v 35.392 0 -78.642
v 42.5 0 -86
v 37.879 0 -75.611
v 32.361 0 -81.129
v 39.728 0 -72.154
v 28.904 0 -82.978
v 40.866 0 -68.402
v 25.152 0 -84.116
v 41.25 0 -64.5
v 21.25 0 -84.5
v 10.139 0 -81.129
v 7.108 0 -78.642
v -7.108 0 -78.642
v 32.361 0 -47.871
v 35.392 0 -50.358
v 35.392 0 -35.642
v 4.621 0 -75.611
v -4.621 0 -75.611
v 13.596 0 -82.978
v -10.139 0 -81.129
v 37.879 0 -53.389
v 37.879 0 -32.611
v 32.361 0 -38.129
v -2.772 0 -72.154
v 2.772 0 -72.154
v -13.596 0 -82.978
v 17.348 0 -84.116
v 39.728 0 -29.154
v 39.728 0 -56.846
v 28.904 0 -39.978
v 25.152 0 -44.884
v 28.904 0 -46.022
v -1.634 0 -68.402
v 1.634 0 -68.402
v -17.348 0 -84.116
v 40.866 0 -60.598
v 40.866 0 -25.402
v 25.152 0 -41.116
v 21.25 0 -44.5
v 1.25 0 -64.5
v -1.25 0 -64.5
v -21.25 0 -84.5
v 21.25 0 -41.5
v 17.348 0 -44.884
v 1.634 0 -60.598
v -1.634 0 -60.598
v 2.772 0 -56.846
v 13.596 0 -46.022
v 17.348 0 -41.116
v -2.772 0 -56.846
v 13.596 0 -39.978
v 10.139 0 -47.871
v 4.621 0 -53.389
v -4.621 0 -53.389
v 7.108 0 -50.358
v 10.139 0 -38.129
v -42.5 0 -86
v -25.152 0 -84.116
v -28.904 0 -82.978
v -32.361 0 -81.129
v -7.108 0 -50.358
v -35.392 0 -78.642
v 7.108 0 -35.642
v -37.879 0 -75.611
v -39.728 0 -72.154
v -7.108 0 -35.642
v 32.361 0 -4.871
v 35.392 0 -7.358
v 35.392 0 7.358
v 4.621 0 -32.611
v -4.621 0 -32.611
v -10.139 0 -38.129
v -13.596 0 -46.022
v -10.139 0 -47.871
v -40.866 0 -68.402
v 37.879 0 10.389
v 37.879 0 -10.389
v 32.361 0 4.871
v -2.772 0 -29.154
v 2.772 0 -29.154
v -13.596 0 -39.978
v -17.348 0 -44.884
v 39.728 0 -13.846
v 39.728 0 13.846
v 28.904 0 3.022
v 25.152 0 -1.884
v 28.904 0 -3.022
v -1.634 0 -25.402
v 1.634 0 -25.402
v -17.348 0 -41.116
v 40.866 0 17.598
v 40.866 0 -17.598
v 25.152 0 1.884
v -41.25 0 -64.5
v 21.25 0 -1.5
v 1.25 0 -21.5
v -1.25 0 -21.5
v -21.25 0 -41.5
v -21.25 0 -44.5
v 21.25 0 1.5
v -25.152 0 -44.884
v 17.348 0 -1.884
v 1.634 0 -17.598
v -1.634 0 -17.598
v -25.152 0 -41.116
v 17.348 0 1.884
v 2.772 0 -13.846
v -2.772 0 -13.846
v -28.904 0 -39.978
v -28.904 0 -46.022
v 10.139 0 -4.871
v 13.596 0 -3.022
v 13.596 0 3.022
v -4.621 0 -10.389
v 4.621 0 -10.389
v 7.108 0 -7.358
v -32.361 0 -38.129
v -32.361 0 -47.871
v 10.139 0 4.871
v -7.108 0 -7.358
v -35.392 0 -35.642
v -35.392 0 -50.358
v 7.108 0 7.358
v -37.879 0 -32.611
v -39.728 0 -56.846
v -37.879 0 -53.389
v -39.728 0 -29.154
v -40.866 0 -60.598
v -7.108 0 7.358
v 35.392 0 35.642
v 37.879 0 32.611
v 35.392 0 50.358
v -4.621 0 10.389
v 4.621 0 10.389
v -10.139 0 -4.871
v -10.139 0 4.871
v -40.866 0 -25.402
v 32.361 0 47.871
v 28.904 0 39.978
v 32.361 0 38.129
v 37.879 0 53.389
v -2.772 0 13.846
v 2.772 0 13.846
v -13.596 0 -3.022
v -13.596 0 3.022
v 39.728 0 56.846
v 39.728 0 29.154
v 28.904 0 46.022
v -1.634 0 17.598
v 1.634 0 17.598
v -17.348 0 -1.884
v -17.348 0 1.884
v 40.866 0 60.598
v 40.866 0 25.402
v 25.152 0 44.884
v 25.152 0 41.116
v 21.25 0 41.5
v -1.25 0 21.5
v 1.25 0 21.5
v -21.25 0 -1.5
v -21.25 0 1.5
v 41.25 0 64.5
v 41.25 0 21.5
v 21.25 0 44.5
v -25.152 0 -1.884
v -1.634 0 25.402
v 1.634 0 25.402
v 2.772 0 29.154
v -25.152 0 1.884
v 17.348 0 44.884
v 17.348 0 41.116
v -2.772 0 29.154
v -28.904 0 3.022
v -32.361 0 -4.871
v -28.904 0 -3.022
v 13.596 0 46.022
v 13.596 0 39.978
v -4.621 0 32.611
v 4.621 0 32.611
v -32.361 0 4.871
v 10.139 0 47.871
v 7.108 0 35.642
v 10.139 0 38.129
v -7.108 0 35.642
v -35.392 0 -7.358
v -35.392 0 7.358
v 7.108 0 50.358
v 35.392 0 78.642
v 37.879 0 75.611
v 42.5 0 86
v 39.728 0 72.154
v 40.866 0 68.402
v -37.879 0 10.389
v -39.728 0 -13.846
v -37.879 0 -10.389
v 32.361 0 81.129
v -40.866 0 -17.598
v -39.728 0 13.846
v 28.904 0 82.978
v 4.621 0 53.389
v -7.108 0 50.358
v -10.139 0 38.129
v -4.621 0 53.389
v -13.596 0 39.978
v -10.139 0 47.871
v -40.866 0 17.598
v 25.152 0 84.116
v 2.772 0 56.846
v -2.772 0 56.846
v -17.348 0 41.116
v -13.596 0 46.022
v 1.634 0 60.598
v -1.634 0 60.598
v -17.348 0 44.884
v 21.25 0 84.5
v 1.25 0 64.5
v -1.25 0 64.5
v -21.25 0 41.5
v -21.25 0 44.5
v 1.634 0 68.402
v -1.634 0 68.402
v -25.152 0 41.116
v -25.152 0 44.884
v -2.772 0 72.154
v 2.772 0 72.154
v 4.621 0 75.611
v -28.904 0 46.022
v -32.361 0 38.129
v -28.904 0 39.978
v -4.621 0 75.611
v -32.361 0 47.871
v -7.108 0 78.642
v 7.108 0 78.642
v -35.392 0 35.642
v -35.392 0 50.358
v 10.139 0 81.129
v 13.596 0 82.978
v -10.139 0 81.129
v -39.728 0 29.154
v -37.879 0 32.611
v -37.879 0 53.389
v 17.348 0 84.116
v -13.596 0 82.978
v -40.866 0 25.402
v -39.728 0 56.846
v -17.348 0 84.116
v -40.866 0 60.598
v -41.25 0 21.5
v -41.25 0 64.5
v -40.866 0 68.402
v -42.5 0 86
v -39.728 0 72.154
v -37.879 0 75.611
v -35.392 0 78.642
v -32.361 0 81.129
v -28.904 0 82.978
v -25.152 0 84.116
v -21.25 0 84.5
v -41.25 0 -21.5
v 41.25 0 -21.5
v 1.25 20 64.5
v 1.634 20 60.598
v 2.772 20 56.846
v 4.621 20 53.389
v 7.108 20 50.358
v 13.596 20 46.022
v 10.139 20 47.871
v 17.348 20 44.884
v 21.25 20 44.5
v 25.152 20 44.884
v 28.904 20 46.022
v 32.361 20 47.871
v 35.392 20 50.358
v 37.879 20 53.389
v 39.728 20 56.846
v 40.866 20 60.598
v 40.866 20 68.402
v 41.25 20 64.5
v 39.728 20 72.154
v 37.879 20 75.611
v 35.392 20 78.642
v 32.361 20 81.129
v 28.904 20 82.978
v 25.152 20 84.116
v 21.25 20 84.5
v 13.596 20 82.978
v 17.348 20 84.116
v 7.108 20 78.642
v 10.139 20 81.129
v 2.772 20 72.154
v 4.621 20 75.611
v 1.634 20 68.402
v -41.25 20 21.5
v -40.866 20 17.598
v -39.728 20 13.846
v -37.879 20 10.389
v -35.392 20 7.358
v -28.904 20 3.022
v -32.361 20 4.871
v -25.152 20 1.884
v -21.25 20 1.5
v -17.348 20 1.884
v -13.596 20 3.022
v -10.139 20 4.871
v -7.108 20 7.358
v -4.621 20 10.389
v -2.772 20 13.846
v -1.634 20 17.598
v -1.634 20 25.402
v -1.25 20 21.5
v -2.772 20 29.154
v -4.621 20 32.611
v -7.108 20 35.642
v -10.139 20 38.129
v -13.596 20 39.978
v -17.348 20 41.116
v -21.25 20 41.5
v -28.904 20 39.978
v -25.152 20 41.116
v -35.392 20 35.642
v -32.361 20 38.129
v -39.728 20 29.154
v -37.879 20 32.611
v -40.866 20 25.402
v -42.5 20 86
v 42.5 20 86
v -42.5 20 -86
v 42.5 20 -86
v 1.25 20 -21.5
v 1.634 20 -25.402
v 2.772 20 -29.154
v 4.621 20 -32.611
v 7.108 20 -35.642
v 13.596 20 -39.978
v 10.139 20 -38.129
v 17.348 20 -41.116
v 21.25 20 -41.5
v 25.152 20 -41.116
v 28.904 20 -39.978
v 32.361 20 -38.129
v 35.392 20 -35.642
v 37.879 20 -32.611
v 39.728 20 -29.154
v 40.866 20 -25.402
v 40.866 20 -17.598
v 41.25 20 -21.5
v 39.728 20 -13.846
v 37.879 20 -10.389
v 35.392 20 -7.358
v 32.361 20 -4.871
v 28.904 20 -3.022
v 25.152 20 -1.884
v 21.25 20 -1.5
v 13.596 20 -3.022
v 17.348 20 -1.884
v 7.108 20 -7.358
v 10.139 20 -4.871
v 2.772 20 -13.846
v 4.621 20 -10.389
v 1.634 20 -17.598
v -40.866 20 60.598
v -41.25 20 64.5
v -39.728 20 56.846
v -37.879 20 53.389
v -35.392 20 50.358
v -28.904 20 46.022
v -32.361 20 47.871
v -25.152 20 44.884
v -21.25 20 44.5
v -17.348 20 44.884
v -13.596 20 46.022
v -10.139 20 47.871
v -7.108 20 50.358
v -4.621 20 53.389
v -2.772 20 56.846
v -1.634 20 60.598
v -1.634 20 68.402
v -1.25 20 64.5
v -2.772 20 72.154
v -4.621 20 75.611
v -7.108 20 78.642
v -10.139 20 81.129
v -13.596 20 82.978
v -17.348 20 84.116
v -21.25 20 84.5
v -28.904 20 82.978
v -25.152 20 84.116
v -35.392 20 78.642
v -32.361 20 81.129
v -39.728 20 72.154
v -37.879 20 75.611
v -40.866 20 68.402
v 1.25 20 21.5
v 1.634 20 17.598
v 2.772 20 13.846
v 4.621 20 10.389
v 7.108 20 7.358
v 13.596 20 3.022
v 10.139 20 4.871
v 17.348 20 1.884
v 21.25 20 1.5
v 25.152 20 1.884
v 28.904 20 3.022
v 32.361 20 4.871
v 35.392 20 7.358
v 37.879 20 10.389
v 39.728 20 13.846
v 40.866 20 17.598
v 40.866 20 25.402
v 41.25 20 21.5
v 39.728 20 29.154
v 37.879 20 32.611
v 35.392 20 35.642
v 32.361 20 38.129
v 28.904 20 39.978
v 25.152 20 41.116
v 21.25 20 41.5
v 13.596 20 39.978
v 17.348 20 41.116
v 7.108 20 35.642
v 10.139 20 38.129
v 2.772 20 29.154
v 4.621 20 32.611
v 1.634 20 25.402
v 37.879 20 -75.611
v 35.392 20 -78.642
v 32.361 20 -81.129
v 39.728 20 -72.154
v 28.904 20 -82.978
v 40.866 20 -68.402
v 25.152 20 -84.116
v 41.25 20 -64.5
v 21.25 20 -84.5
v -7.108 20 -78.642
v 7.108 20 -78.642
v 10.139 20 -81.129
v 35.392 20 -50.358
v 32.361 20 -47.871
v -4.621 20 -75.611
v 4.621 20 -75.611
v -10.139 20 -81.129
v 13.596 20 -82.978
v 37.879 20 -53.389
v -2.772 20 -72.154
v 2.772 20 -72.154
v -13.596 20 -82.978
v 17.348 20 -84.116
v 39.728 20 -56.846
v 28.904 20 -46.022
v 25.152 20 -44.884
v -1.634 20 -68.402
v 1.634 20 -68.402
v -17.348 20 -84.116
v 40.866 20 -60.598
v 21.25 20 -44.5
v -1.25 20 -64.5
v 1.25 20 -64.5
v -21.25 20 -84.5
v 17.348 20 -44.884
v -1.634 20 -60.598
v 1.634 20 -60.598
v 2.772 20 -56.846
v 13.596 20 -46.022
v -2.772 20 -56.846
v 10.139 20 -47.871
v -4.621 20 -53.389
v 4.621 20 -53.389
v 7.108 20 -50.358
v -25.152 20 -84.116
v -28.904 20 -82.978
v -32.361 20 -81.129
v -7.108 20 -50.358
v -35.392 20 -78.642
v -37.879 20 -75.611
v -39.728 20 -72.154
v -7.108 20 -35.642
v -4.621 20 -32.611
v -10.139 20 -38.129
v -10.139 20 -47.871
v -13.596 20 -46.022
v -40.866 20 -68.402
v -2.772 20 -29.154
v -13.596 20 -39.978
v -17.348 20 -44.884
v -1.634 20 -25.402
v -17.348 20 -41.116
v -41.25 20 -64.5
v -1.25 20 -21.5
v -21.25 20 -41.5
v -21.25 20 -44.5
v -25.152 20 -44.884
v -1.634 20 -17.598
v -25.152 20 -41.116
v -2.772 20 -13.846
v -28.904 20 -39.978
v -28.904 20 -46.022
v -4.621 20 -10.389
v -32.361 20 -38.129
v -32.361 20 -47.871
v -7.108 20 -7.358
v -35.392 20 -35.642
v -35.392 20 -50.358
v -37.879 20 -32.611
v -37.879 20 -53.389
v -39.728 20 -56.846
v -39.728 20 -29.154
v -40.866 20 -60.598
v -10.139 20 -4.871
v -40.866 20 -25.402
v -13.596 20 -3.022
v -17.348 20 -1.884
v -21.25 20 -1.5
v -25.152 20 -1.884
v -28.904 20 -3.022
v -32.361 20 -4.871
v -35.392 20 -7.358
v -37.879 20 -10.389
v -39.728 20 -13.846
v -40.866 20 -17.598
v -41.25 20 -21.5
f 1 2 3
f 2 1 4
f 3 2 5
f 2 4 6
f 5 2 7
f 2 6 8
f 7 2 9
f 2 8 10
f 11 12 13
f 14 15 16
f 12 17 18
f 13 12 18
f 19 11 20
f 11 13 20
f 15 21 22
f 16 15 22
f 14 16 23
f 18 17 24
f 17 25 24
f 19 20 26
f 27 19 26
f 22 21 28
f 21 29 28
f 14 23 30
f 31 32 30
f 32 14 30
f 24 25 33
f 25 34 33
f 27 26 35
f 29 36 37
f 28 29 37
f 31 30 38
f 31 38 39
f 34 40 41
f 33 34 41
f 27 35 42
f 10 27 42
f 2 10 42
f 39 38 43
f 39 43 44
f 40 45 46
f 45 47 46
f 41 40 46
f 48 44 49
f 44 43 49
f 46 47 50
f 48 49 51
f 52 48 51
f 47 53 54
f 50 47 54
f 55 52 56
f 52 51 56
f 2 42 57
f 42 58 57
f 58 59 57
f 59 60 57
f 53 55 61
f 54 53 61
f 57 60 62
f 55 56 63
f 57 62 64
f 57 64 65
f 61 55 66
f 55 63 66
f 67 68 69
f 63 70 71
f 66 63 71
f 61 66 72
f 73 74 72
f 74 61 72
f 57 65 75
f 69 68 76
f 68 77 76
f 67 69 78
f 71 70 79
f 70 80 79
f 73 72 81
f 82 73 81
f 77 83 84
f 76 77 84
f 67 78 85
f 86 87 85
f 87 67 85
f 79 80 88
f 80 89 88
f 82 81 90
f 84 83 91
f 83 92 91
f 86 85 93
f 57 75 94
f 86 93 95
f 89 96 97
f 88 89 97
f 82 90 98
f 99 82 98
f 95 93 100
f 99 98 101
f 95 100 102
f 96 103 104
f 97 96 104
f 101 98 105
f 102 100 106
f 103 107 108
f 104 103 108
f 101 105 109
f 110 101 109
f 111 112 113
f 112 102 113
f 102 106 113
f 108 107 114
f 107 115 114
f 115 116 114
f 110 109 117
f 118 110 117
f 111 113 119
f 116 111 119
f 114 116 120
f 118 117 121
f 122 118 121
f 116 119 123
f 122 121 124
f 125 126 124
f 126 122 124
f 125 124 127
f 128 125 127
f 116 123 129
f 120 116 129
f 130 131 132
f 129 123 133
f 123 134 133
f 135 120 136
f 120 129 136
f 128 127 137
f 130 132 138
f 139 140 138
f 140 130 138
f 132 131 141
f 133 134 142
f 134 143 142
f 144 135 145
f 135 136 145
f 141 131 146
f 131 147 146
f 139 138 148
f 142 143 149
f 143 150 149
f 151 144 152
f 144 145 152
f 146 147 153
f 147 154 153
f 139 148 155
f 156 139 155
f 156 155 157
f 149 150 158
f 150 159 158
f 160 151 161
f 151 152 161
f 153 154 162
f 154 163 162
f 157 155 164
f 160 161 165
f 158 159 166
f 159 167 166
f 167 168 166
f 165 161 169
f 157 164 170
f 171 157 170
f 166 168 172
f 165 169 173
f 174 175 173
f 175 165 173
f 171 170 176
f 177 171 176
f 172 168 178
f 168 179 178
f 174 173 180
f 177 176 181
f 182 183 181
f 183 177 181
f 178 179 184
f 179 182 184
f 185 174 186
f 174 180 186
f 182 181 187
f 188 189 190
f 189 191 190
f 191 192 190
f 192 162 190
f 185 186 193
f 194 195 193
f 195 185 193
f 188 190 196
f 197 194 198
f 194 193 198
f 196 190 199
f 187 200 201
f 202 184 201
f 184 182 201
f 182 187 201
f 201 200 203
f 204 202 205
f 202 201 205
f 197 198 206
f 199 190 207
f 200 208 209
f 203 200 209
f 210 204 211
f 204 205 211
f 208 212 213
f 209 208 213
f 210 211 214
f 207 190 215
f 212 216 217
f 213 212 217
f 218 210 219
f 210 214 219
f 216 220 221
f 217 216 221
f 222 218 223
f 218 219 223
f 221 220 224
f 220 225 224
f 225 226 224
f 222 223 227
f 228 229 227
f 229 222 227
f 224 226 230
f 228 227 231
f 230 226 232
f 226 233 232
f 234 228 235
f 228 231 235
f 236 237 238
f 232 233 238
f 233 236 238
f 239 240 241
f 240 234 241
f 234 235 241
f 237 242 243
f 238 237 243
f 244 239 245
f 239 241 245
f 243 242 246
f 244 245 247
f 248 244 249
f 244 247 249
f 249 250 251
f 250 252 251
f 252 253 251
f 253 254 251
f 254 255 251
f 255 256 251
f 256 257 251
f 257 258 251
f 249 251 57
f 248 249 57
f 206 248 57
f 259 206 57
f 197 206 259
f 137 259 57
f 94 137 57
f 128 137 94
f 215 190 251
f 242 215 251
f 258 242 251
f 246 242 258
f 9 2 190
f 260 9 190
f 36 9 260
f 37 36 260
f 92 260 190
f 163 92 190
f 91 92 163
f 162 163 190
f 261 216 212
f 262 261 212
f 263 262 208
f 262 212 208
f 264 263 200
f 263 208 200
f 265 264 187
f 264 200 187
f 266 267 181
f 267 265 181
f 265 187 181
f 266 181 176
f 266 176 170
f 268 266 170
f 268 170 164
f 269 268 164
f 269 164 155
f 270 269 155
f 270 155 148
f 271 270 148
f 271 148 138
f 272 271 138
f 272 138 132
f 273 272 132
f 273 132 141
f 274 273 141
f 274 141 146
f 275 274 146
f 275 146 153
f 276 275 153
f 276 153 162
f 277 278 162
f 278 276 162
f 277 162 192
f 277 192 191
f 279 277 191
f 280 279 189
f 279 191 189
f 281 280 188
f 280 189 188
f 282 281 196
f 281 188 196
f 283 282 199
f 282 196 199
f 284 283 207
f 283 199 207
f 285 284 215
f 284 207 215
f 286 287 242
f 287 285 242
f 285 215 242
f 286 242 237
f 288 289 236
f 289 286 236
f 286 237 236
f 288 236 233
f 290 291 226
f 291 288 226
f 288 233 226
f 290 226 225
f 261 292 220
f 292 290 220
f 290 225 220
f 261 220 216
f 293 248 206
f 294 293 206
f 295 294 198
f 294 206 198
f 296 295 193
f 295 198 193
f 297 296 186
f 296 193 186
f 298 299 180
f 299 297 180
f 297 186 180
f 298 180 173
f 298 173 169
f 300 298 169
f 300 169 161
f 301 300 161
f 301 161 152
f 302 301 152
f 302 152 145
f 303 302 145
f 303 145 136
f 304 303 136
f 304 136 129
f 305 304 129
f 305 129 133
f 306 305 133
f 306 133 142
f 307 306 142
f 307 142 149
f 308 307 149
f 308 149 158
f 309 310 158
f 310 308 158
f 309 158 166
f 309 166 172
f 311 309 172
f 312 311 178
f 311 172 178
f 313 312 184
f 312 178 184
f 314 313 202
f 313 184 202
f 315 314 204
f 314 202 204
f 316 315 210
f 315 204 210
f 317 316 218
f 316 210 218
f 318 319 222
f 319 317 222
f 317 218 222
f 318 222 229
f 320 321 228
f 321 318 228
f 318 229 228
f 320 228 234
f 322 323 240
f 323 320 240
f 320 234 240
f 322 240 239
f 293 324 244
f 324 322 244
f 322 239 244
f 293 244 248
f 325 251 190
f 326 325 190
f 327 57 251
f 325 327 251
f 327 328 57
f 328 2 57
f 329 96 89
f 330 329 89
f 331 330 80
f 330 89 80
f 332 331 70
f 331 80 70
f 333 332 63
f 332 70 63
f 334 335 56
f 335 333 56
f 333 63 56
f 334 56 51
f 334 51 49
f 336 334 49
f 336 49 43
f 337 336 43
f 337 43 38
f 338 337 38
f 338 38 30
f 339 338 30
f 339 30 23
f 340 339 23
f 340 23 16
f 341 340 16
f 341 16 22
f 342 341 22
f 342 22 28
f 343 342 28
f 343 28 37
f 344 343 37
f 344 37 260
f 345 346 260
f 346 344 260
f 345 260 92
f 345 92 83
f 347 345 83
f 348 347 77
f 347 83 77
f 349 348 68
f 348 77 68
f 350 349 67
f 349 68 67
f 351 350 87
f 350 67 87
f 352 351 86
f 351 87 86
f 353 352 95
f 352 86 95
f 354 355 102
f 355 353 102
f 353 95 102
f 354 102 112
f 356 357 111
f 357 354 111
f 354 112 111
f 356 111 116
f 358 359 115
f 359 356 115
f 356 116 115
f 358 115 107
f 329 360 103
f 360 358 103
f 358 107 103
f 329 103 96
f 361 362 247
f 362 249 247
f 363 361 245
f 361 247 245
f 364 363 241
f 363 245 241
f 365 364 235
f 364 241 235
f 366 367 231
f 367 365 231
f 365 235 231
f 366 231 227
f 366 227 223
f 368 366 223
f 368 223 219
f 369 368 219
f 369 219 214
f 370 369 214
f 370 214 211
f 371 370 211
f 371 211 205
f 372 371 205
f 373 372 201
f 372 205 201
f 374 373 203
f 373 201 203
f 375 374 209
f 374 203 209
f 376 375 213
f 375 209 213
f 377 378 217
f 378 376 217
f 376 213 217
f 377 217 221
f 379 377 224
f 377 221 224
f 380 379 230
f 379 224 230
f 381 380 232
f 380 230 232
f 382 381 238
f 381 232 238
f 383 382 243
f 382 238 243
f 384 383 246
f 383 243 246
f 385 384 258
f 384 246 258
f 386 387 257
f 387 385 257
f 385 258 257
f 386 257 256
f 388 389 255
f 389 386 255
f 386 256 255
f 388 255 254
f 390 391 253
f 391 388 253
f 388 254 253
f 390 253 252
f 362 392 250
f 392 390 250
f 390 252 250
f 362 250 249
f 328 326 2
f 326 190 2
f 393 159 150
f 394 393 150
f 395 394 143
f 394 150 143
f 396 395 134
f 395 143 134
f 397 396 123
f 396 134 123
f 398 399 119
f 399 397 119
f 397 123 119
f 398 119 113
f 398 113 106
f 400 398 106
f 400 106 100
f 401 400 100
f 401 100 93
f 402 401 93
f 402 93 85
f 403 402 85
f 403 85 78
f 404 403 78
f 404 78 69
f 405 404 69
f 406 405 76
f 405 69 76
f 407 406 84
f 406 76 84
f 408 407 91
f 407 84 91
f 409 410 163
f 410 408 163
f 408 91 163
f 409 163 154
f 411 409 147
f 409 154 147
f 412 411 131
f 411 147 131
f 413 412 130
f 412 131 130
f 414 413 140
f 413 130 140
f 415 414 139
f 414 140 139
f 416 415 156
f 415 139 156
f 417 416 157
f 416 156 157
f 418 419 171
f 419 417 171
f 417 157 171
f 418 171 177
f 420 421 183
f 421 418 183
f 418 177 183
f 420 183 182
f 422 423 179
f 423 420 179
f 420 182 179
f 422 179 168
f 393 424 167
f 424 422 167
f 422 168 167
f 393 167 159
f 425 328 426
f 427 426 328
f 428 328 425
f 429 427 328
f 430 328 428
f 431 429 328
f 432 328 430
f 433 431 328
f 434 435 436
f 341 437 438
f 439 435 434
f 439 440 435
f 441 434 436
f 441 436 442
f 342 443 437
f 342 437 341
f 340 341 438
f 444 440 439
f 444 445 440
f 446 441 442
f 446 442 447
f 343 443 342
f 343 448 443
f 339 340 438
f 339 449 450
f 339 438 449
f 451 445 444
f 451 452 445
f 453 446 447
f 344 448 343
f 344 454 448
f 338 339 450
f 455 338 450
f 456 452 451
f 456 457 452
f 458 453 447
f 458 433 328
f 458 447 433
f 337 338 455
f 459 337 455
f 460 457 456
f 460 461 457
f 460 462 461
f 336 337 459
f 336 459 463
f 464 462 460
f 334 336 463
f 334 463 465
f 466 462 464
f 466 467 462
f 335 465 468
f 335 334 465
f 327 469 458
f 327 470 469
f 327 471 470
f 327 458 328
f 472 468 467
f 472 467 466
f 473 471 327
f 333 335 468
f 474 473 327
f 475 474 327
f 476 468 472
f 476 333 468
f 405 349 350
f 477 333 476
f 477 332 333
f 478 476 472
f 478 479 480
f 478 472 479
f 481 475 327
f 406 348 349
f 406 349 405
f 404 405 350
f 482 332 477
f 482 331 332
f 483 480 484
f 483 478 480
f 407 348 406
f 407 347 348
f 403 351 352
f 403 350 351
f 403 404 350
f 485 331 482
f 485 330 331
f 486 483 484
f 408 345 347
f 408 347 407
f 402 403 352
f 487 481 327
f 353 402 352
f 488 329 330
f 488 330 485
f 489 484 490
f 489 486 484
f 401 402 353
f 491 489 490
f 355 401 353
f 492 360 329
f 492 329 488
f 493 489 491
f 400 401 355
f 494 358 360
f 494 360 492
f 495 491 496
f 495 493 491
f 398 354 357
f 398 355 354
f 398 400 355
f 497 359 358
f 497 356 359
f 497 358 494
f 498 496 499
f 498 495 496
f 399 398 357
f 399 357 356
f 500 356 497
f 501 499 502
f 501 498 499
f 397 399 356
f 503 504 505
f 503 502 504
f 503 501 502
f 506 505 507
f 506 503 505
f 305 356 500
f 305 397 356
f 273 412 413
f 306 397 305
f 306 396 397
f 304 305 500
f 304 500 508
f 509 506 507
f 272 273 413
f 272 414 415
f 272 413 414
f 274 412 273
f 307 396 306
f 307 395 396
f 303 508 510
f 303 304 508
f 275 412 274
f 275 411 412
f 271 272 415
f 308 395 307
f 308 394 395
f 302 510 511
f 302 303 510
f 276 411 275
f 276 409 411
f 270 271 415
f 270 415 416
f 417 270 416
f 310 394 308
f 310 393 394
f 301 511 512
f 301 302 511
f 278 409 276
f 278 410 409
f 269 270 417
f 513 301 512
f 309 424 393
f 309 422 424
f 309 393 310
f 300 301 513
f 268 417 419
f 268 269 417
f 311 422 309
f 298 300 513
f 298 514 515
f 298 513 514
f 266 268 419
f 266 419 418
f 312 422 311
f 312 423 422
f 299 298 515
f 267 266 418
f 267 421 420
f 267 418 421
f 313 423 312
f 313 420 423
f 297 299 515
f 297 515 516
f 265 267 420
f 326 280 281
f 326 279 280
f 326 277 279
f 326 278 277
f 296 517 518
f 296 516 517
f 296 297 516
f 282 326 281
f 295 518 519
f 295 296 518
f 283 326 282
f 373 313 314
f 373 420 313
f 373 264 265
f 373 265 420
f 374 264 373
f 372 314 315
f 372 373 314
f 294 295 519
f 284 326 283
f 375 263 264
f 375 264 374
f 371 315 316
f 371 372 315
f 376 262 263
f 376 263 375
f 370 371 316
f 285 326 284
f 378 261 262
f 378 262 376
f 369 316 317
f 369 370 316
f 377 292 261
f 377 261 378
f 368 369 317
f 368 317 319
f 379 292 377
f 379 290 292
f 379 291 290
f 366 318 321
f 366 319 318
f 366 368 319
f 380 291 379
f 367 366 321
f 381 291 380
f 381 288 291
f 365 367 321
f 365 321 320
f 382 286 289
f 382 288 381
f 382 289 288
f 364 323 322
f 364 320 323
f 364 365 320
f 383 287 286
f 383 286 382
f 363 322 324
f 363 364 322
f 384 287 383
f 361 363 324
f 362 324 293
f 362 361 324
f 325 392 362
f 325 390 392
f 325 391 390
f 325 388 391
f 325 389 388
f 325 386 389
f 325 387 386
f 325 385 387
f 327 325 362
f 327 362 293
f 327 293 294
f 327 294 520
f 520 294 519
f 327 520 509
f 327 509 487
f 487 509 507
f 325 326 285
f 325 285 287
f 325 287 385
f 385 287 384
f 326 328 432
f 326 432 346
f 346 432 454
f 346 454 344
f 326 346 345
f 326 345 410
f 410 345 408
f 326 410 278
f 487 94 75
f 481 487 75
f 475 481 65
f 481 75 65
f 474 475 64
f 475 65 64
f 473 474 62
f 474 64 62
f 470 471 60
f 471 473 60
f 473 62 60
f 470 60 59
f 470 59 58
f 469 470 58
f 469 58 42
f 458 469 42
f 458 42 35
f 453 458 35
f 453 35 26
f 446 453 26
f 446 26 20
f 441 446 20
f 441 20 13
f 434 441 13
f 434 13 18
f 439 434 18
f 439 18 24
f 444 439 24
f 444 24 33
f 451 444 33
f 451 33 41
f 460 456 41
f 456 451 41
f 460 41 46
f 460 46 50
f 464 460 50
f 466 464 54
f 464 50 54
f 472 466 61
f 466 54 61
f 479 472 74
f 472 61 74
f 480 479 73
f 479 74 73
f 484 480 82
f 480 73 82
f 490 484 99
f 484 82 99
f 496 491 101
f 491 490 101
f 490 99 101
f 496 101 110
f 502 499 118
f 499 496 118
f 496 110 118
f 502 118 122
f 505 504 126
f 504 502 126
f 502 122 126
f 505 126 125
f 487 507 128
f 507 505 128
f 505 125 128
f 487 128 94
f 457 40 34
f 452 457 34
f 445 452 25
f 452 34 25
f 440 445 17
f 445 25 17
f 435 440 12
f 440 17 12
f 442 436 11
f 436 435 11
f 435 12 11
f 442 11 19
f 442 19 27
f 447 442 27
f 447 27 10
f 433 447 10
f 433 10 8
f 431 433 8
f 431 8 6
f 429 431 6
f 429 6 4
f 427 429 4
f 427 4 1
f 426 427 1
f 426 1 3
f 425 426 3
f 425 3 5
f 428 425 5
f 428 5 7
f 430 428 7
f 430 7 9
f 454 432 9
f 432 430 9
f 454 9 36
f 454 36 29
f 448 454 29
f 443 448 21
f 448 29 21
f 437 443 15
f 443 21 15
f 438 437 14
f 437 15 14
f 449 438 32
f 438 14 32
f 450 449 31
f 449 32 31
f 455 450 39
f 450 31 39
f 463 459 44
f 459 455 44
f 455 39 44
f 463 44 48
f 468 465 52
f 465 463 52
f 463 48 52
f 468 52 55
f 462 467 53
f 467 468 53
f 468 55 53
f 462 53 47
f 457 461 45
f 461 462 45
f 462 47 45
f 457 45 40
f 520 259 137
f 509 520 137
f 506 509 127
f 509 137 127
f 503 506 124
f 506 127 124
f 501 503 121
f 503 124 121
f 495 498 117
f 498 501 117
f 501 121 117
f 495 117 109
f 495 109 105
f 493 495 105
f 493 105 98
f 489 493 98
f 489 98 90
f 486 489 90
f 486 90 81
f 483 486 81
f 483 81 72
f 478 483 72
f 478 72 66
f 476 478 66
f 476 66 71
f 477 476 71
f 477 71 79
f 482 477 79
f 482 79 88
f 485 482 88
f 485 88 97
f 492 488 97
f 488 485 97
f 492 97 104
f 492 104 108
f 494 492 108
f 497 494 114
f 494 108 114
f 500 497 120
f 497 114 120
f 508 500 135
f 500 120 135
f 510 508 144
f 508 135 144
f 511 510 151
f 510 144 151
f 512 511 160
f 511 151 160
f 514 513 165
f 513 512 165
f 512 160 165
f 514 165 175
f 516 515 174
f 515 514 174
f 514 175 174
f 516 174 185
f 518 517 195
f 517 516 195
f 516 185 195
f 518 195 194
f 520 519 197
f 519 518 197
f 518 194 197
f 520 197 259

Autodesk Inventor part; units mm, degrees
ref_plane "YZ Plane" through (0, 0, 0) normal (1, 0, 0) x (0, 1, 0)
ref_plane "XZ Plane" through (0, 0, 0) normal (0, 1, 0) x (-1, 0, 0)
ref_plane "XY Plane" through (0, 0, 0) normal (0, 0, 1) x (1, 0, 0)
sketch "Sketch1" plane through (0, 0, 0) normal (0, 1, 0) x (-1, 0, 0)
  line L0 (42.5, 86) -> (-42.5, 86)
  line L1 (-42.5, 86) -> (-42.5, -86)
  line L2 (-42.5, -86) -> (42.5, -86)
  line L3 (42.5, -86) -> (42.5, 86)
  line L4 (42.5, 0) -> (-42.5, 0) construction
  circle A0 centre (21.25, 64.5) radius 20
  line L5 (-21.25, 86) -> (-21.25, -86) construction
  line L6 (21.25, -86) -> (21.25, 86) construction
  circle A1 centre (21.25, 21.5) radius 20
  circle A2 centre (21.25, -21.5) radius 20
  circle A3 centre (21.25, -64.5) radius 20
  circle A4 centre (-21.25, -64.5) radius 20
  circle A5 centre (-21.25, -21.5) radius 20
  circle A6 centre (-21.25, 21.5) radius 20
  circle A7 centre (-21.25, 64.5) radius 20
  line L7 (42.5, 64.5) -> (-42.5, 64.5) construction
  line L8 (42.5, 21.5) -> (-42.5, 21.5) construction
  line L9 (42.5, -21.5) -> (-42.5, -21.5) construction
  line L10 (42.5, -64.5) -> (-42.5, -64.5) construction
  point P0 (0, 0)
  point P1 (0, 0)
  dimension "d0" = 172
  dimension "d1" = 85
  dimension "d2" = 40
  dimension "d3" = 42.5
  dimension "d4" = 21.25
  dimension "d5" = 43
  dimension "d6" = 43
  dimension "d7" = 43
  dimension "d8" = 21.5
extrude "Extrusion1" add sketch "Sketch1" along normal blind 20
equation "\"d3\" = 0.5 * d1"
equation "\"d4\" = 0.25 * d1"
equation "\"d5\" = 0.25 * d0"
equation "\"d6\" = d5"
equation "\"d7\" = d5"
equation "\"d8\" = 0.125 * d0"
properties part number "Cell_Spacer" material "ABS Plastic"
